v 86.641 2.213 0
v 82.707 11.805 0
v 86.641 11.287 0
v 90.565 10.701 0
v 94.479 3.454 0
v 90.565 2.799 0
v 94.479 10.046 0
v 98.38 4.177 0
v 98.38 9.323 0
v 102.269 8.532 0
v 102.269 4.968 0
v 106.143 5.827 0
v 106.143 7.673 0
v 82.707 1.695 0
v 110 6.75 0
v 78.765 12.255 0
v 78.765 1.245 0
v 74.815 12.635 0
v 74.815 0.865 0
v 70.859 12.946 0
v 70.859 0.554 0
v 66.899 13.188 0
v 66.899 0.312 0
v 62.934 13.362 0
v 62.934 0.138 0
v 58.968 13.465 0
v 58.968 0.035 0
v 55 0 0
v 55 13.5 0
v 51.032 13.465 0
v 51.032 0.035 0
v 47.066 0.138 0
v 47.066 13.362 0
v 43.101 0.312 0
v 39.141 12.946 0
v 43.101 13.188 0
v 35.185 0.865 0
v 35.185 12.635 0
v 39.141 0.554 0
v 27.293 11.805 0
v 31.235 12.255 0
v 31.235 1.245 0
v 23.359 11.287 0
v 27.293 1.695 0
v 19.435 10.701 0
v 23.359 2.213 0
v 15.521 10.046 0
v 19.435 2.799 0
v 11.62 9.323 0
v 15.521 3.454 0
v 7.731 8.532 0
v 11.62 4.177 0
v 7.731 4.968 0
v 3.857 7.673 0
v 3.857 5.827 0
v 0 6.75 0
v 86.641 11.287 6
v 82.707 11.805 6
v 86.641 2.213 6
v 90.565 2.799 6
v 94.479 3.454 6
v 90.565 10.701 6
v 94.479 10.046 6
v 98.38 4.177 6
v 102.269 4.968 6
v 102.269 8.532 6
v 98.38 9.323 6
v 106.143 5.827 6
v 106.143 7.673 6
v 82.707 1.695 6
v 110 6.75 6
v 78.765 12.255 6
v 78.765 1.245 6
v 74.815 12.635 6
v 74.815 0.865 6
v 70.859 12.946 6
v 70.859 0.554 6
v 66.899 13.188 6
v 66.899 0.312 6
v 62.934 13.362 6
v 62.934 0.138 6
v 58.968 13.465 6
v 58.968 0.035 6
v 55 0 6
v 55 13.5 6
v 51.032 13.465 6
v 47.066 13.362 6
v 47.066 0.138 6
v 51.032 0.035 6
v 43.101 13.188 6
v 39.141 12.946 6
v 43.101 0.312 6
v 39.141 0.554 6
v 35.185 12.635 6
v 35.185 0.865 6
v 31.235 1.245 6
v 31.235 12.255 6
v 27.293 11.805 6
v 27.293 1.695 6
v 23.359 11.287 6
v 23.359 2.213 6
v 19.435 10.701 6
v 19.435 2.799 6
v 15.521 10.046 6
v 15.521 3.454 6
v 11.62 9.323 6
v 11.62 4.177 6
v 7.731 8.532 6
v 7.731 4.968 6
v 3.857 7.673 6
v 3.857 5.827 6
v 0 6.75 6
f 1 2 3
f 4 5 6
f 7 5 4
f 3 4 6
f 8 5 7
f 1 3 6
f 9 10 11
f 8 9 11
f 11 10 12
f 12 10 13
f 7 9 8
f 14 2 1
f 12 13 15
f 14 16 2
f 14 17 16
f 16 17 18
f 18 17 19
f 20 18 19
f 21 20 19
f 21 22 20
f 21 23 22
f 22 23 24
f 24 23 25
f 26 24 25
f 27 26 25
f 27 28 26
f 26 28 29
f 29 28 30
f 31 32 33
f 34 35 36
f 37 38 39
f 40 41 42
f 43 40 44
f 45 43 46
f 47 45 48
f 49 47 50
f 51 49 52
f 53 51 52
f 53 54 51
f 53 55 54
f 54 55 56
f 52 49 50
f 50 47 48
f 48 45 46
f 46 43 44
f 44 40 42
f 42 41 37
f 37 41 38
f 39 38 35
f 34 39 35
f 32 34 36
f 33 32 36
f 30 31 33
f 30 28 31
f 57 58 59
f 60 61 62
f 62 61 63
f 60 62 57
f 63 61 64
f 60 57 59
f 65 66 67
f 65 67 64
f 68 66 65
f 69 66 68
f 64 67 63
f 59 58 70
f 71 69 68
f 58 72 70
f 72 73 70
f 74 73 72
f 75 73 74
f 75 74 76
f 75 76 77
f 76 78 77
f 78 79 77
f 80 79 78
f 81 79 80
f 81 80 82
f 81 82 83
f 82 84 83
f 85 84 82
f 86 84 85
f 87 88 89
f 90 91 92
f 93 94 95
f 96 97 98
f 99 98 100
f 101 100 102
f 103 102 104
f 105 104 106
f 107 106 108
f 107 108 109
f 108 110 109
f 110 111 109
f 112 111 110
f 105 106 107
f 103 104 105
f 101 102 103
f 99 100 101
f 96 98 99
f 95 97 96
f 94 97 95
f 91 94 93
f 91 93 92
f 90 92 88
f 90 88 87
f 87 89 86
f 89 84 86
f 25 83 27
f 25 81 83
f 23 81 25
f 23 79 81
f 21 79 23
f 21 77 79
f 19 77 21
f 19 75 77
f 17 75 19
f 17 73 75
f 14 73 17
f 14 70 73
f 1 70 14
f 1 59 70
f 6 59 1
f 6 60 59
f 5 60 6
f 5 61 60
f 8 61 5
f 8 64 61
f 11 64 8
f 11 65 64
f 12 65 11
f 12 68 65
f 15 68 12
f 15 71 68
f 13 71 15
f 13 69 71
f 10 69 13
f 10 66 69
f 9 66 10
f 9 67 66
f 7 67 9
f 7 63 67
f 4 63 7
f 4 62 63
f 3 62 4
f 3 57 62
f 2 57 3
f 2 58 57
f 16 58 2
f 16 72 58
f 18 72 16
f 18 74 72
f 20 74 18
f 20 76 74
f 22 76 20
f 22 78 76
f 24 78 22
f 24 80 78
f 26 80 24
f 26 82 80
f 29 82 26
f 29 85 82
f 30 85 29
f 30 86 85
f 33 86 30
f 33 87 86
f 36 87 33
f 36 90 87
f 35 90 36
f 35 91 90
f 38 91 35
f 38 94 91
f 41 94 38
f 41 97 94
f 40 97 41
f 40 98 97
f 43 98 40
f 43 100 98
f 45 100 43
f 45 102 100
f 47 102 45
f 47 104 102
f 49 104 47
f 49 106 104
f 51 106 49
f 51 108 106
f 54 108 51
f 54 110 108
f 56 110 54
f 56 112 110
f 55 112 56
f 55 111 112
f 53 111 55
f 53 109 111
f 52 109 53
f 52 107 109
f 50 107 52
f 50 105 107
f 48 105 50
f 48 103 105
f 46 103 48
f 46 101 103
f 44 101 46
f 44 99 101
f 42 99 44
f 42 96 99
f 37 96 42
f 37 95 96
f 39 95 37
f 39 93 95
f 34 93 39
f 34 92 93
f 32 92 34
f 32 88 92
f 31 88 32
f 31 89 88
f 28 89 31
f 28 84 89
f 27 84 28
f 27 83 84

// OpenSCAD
$fn = 32;

// ----------------------------------------------------------------------
// Arc profile plate: lens, 56 points
// ----------------------------------------------------------------------

// --- parameters (mm) ---
lens_chord = 110;         // chord length of the lens, X
arc_r = 227.35;           // radius of both arcs
arc_angle = 28;           // angle of each arc, degrees
sagitta = 6.75;           // bulge of each arc (half the lens height)
arc_step = 1;             // sampling step of the arcs, degrees
plate_t = 6;              // plate thickness, Z
fit_tol = 0.1;            // declared fit tolerance (prompt contract)
free_tol = 0.5;           // declared free tolerance (prompt contract)

bbox_y = 2 * sagitta;  // full lens height

profile = [[110, 6.75], [106.143, 7.673], [102.269, 8.532], [98.38, 9.323], [94.479, 10.046], [90.565, 10.701], [86.641, 11.287], [82.707, 11.805], [78.765, 12.255], [74.815, 12.635], [70.859, 12.946], [66.899, 13.188], [62.934, 13.362], [58.968, 13.465], [55, 13.5], [51.032, 13.465], [47.066, 13.362], [43.101, 13.188], [39.141, 12.946], [35.185, 12.635], [31.235, 12.255], [27.293, 11.805], [23.359, 11.287], [19.435, 10.701], [15.521, 10.046], [11.62, 9.323], [7.731, 8.532], [3.857, 7.673], [0, 6.75], [3.857, 5.827], [7.731, 4.968], [11.62, 4.177], [15.521, 3.454], [19.435, 2.799], [23.359, 2.213], [27.293, 1.695], [31.235, 1.245], [35.185, 0.865], [39.141, 0.554], [43.101, 0.312], [47.066, 0.138], [51.032, 0.035], [55, 0], [58.968, 0.035], [62.934, 0.138], [66.899, 0.312], [70.859, 0.554], [74.815, 0.865], [78.765, 1.245], [82.707, 1.695], [86.641, 2.213], [90.565, 2.799], [94.479, 3.454], [98.38, 4.177], [102.269, 4.968], [106.143, 5.827]];  // primary outline, 56 points, counter clockwise

// --- the one profile operation ---
linear_extrude(height = plate_t) polygon(points = profile);
